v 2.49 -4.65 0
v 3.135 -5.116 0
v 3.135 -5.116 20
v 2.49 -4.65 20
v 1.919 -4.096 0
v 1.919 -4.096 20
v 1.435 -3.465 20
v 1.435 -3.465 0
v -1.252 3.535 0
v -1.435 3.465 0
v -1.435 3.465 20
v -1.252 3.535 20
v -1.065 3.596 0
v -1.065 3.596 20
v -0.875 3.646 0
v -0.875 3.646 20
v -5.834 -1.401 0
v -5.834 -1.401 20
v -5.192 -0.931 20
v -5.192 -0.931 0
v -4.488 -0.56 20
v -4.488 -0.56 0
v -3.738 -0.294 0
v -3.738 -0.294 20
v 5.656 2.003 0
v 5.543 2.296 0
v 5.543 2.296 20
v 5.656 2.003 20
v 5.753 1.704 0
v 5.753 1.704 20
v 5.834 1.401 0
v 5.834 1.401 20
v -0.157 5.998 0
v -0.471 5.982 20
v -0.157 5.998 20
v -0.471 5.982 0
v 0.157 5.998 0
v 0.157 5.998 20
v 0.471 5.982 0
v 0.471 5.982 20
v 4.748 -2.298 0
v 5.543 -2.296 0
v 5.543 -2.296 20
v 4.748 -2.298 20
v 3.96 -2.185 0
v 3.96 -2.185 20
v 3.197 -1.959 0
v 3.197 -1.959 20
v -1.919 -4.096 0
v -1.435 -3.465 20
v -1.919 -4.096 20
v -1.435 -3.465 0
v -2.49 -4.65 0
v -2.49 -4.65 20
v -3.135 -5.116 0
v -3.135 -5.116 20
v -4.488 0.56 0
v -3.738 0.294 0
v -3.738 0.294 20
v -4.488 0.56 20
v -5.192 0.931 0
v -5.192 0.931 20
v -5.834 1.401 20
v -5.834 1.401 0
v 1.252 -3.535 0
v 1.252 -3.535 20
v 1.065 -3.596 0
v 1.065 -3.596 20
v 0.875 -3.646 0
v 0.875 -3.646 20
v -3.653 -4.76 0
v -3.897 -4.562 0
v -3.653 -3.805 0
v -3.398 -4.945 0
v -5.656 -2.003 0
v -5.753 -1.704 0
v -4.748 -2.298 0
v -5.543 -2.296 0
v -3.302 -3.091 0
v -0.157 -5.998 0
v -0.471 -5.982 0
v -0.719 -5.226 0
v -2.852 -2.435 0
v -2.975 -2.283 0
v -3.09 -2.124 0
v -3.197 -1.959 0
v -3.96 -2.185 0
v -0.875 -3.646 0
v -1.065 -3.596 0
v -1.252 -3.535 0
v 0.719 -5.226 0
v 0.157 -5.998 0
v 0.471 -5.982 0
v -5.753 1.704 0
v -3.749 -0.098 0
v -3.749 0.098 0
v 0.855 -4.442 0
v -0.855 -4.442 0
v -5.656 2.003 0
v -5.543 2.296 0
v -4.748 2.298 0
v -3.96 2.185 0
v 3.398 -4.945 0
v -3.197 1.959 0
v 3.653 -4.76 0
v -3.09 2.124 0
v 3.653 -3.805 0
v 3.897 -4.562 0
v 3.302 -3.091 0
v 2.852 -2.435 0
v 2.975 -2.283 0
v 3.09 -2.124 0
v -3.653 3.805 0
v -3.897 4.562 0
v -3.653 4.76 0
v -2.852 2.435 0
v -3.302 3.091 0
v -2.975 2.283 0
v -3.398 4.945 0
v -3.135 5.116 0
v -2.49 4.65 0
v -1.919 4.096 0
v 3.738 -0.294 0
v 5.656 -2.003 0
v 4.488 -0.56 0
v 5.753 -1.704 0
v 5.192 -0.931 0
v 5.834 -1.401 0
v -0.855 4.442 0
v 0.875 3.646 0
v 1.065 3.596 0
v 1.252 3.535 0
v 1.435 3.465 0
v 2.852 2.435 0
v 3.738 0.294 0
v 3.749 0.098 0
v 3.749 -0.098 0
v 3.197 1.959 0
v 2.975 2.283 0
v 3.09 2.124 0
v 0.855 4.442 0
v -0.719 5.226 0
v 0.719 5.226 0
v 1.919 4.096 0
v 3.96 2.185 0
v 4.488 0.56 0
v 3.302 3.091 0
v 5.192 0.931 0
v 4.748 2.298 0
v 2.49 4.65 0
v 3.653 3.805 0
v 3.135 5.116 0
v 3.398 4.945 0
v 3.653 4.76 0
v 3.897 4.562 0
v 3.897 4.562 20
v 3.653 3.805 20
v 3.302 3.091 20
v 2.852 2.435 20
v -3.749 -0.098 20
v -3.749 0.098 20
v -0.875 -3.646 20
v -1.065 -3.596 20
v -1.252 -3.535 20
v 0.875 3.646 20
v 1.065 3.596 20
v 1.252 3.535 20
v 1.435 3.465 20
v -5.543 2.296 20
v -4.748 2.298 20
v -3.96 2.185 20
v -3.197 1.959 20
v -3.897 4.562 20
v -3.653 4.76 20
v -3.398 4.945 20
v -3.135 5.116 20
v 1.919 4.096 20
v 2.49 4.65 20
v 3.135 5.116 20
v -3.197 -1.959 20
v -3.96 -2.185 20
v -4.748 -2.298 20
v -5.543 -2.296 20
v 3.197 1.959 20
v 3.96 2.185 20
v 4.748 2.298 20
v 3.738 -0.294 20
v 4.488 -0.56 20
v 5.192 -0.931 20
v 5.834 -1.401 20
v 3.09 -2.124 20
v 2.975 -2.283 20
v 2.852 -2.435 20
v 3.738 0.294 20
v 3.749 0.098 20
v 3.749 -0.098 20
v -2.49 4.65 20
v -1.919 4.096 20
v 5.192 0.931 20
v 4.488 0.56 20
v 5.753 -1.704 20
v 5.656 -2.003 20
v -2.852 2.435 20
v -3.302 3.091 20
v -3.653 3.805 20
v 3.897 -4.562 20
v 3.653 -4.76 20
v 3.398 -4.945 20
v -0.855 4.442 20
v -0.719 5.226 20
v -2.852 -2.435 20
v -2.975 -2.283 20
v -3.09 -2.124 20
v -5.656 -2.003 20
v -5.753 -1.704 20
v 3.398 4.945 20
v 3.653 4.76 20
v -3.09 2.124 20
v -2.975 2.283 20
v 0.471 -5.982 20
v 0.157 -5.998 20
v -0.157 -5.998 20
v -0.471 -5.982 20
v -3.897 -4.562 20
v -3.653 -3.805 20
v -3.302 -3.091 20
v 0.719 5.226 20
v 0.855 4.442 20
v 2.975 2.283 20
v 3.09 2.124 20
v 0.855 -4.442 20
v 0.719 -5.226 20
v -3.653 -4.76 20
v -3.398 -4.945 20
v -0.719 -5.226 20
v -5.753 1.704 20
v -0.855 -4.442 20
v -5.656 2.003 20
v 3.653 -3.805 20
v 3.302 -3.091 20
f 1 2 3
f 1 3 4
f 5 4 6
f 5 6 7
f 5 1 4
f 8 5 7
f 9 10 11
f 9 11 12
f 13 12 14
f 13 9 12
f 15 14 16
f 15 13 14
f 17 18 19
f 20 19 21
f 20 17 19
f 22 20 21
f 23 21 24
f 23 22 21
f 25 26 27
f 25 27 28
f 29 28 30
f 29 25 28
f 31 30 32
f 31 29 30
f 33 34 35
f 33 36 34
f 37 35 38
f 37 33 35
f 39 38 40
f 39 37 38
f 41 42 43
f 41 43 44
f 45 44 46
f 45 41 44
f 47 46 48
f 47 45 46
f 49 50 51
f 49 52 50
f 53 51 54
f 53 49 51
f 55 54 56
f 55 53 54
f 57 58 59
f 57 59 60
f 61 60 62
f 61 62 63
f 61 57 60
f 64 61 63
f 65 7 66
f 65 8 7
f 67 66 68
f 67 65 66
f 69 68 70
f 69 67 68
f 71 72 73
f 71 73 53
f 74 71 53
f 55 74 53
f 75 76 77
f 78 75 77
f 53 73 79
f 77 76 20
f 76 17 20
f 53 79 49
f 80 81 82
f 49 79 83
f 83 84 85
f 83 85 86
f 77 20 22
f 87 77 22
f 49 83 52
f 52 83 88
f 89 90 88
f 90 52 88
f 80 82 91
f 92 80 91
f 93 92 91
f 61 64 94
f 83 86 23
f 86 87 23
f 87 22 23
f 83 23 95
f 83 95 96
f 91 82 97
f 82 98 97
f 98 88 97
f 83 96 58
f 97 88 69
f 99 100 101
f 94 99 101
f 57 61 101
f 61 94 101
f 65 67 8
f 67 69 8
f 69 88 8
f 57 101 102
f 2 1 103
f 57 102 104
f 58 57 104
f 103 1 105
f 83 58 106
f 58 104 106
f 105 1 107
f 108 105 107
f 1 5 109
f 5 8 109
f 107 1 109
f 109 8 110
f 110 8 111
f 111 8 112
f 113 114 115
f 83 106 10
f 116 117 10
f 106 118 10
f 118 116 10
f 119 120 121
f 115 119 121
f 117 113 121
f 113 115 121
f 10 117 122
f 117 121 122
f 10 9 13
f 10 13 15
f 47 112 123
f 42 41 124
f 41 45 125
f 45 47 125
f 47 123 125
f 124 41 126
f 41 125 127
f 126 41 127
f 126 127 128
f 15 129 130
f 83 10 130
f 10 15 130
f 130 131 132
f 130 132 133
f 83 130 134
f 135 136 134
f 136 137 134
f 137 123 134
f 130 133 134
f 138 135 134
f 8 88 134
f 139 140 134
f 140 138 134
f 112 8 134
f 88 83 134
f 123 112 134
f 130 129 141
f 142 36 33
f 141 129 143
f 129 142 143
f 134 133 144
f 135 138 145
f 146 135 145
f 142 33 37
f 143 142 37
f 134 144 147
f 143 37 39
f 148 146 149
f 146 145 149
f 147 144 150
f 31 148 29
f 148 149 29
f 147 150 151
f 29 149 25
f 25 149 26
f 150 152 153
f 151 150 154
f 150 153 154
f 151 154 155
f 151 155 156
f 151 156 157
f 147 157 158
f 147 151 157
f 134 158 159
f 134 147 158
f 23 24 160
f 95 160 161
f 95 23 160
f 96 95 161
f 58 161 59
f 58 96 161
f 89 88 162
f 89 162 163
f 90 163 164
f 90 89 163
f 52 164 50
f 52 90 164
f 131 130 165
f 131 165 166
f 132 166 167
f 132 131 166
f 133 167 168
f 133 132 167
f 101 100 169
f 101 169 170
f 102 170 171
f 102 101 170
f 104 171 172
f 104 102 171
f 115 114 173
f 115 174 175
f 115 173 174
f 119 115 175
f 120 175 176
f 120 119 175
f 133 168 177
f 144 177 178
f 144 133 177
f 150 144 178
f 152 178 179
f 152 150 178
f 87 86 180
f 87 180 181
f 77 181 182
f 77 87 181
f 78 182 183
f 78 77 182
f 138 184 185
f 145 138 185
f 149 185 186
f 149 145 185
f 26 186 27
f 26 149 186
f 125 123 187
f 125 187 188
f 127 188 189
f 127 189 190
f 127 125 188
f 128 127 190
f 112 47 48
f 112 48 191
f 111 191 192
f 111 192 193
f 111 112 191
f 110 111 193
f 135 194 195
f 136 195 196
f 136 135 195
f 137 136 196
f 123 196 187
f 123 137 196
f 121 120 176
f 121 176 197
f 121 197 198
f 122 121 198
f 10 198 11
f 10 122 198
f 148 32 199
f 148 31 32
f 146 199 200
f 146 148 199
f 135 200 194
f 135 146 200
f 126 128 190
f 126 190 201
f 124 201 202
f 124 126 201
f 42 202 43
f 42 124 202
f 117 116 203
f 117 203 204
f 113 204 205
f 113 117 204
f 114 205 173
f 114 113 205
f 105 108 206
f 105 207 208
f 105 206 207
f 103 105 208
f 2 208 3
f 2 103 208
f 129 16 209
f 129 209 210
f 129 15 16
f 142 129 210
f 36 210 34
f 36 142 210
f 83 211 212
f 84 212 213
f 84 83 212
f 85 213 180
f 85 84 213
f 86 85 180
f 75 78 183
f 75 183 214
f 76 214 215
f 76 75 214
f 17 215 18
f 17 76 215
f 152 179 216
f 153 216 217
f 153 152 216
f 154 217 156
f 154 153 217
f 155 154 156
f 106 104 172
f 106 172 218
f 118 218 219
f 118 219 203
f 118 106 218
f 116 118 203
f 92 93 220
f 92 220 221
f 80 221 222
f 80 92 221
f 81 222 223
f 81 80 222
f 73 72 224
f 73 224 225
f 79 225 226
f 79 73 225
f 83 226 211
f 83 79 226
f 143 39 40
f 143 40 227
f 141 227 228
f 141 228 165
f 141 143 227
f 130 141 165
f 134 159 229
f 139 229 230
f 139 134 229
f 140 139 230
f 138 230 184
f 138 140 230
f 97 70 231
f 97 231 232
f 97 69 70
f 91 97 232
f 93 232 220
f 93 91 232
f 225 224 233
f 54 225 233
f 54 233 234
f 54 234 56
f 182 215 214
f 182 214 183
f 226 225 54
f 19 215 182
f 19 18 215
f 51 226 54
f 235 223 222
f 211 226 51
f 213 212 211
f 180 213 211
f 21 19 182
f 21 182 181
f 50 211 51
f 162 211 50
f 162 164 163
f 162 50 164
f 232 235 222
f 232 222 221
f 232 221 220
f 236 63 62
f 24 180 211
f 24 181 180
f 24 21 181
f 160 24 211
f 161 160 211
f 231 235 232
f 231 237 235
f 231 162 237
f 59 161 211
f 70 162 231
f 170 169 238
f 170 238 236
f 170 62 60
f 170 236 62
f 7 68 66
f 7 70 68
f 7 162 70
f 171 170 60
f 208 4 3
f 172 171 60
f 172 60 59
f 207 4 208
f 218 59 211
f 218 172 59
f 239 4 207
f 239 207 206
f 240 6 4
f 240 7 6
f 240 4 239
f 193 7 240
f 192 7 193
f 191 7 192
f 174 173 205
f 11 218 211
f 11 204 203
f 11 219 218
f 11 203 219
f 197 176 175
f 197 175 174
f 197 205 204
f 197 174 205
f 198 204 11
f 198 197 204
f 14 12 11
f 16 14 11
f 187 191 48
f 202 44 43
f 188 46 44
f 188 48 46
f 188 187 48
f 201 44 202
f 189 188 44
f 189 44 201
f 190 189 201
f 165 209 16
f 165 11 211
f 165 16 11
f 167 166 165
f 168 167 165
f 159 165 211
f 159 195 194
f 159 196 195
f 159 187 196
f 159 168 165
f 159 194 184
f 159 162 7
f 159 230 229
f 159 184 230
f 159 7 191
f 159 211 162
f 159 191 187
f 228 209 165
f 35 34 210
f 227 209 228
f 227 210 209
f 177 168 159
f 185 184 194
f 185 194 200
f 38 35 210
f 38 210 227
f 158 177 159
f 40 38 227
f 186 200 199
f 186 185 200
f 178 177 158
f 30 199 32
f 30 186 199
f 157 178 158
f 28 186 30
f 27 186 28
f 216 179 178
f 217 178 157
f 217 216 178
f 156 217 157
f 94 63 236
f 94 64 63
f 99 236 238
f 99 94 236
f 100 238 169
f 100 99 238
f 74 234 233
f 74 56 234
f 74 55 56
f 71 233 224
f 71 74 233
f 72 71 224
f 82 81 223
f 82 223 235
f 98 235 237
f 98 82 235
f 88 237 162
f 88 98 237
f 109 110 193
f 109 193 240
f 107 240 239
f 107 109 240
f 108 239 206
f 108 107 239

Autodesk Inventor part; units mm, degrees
sketch "Sketch1" plane through (0, 0, 0) normal (0, 0, 1) x (1, 0, 0)
  circle A0 centre (0, 0) radius 6
  dimension "d0" = 12
extrude "Extrusion1" add sketch "Sketch1" along normal blind 20
ref_plane "Work Plane2" through (0, 0, 10) normal (0, 0, 1) x (1, 0, 0)
sketch "Sketch2" plane through (0, 0, 0) normal (0, 0, -1) x (-1, 0, 0)
  circle A0 centre (0, 0) radius 6 projected
  circle A1 centre (0, 0) radius 5
  dimension "d3" = 10
surface extrude "Pitch Diameter" sketch "Sketch2" against normal through all shown no curves A1
ref_plane "Work Plane8" through (0, 0, 0) normal (0.9510565, 0.309017, 0) x (0, 0, 1)
ref_plane "Work Plane9" through (0, 0, 0) normal (1, 0, 0) x (0, 1, 0)
spur gear teeth "Spur Gear" teeth 10 pitch diameter 10 tip diameter 12 root diameter 7.5 face width 20 start plane through (0, 0, 0) normal (0, 0, -1) x (-1, 0, 0)
equation "\"d0\" = da_da"
equation "\"d1\" = da_b"
equation "\"d3\" = da_d"
equation "\"d16\" = da_aw"
equation "\"d43\" = da_aw"
equation "\"d46\" = da_aw"
equation "\"da_da\" = 12"
equation "\"da_b\" = 20"
equation "\"da_d\" = 10"
equation "\"da_aw\" = 7.5"
properties part number "Spur Gear1" material "Steel"
